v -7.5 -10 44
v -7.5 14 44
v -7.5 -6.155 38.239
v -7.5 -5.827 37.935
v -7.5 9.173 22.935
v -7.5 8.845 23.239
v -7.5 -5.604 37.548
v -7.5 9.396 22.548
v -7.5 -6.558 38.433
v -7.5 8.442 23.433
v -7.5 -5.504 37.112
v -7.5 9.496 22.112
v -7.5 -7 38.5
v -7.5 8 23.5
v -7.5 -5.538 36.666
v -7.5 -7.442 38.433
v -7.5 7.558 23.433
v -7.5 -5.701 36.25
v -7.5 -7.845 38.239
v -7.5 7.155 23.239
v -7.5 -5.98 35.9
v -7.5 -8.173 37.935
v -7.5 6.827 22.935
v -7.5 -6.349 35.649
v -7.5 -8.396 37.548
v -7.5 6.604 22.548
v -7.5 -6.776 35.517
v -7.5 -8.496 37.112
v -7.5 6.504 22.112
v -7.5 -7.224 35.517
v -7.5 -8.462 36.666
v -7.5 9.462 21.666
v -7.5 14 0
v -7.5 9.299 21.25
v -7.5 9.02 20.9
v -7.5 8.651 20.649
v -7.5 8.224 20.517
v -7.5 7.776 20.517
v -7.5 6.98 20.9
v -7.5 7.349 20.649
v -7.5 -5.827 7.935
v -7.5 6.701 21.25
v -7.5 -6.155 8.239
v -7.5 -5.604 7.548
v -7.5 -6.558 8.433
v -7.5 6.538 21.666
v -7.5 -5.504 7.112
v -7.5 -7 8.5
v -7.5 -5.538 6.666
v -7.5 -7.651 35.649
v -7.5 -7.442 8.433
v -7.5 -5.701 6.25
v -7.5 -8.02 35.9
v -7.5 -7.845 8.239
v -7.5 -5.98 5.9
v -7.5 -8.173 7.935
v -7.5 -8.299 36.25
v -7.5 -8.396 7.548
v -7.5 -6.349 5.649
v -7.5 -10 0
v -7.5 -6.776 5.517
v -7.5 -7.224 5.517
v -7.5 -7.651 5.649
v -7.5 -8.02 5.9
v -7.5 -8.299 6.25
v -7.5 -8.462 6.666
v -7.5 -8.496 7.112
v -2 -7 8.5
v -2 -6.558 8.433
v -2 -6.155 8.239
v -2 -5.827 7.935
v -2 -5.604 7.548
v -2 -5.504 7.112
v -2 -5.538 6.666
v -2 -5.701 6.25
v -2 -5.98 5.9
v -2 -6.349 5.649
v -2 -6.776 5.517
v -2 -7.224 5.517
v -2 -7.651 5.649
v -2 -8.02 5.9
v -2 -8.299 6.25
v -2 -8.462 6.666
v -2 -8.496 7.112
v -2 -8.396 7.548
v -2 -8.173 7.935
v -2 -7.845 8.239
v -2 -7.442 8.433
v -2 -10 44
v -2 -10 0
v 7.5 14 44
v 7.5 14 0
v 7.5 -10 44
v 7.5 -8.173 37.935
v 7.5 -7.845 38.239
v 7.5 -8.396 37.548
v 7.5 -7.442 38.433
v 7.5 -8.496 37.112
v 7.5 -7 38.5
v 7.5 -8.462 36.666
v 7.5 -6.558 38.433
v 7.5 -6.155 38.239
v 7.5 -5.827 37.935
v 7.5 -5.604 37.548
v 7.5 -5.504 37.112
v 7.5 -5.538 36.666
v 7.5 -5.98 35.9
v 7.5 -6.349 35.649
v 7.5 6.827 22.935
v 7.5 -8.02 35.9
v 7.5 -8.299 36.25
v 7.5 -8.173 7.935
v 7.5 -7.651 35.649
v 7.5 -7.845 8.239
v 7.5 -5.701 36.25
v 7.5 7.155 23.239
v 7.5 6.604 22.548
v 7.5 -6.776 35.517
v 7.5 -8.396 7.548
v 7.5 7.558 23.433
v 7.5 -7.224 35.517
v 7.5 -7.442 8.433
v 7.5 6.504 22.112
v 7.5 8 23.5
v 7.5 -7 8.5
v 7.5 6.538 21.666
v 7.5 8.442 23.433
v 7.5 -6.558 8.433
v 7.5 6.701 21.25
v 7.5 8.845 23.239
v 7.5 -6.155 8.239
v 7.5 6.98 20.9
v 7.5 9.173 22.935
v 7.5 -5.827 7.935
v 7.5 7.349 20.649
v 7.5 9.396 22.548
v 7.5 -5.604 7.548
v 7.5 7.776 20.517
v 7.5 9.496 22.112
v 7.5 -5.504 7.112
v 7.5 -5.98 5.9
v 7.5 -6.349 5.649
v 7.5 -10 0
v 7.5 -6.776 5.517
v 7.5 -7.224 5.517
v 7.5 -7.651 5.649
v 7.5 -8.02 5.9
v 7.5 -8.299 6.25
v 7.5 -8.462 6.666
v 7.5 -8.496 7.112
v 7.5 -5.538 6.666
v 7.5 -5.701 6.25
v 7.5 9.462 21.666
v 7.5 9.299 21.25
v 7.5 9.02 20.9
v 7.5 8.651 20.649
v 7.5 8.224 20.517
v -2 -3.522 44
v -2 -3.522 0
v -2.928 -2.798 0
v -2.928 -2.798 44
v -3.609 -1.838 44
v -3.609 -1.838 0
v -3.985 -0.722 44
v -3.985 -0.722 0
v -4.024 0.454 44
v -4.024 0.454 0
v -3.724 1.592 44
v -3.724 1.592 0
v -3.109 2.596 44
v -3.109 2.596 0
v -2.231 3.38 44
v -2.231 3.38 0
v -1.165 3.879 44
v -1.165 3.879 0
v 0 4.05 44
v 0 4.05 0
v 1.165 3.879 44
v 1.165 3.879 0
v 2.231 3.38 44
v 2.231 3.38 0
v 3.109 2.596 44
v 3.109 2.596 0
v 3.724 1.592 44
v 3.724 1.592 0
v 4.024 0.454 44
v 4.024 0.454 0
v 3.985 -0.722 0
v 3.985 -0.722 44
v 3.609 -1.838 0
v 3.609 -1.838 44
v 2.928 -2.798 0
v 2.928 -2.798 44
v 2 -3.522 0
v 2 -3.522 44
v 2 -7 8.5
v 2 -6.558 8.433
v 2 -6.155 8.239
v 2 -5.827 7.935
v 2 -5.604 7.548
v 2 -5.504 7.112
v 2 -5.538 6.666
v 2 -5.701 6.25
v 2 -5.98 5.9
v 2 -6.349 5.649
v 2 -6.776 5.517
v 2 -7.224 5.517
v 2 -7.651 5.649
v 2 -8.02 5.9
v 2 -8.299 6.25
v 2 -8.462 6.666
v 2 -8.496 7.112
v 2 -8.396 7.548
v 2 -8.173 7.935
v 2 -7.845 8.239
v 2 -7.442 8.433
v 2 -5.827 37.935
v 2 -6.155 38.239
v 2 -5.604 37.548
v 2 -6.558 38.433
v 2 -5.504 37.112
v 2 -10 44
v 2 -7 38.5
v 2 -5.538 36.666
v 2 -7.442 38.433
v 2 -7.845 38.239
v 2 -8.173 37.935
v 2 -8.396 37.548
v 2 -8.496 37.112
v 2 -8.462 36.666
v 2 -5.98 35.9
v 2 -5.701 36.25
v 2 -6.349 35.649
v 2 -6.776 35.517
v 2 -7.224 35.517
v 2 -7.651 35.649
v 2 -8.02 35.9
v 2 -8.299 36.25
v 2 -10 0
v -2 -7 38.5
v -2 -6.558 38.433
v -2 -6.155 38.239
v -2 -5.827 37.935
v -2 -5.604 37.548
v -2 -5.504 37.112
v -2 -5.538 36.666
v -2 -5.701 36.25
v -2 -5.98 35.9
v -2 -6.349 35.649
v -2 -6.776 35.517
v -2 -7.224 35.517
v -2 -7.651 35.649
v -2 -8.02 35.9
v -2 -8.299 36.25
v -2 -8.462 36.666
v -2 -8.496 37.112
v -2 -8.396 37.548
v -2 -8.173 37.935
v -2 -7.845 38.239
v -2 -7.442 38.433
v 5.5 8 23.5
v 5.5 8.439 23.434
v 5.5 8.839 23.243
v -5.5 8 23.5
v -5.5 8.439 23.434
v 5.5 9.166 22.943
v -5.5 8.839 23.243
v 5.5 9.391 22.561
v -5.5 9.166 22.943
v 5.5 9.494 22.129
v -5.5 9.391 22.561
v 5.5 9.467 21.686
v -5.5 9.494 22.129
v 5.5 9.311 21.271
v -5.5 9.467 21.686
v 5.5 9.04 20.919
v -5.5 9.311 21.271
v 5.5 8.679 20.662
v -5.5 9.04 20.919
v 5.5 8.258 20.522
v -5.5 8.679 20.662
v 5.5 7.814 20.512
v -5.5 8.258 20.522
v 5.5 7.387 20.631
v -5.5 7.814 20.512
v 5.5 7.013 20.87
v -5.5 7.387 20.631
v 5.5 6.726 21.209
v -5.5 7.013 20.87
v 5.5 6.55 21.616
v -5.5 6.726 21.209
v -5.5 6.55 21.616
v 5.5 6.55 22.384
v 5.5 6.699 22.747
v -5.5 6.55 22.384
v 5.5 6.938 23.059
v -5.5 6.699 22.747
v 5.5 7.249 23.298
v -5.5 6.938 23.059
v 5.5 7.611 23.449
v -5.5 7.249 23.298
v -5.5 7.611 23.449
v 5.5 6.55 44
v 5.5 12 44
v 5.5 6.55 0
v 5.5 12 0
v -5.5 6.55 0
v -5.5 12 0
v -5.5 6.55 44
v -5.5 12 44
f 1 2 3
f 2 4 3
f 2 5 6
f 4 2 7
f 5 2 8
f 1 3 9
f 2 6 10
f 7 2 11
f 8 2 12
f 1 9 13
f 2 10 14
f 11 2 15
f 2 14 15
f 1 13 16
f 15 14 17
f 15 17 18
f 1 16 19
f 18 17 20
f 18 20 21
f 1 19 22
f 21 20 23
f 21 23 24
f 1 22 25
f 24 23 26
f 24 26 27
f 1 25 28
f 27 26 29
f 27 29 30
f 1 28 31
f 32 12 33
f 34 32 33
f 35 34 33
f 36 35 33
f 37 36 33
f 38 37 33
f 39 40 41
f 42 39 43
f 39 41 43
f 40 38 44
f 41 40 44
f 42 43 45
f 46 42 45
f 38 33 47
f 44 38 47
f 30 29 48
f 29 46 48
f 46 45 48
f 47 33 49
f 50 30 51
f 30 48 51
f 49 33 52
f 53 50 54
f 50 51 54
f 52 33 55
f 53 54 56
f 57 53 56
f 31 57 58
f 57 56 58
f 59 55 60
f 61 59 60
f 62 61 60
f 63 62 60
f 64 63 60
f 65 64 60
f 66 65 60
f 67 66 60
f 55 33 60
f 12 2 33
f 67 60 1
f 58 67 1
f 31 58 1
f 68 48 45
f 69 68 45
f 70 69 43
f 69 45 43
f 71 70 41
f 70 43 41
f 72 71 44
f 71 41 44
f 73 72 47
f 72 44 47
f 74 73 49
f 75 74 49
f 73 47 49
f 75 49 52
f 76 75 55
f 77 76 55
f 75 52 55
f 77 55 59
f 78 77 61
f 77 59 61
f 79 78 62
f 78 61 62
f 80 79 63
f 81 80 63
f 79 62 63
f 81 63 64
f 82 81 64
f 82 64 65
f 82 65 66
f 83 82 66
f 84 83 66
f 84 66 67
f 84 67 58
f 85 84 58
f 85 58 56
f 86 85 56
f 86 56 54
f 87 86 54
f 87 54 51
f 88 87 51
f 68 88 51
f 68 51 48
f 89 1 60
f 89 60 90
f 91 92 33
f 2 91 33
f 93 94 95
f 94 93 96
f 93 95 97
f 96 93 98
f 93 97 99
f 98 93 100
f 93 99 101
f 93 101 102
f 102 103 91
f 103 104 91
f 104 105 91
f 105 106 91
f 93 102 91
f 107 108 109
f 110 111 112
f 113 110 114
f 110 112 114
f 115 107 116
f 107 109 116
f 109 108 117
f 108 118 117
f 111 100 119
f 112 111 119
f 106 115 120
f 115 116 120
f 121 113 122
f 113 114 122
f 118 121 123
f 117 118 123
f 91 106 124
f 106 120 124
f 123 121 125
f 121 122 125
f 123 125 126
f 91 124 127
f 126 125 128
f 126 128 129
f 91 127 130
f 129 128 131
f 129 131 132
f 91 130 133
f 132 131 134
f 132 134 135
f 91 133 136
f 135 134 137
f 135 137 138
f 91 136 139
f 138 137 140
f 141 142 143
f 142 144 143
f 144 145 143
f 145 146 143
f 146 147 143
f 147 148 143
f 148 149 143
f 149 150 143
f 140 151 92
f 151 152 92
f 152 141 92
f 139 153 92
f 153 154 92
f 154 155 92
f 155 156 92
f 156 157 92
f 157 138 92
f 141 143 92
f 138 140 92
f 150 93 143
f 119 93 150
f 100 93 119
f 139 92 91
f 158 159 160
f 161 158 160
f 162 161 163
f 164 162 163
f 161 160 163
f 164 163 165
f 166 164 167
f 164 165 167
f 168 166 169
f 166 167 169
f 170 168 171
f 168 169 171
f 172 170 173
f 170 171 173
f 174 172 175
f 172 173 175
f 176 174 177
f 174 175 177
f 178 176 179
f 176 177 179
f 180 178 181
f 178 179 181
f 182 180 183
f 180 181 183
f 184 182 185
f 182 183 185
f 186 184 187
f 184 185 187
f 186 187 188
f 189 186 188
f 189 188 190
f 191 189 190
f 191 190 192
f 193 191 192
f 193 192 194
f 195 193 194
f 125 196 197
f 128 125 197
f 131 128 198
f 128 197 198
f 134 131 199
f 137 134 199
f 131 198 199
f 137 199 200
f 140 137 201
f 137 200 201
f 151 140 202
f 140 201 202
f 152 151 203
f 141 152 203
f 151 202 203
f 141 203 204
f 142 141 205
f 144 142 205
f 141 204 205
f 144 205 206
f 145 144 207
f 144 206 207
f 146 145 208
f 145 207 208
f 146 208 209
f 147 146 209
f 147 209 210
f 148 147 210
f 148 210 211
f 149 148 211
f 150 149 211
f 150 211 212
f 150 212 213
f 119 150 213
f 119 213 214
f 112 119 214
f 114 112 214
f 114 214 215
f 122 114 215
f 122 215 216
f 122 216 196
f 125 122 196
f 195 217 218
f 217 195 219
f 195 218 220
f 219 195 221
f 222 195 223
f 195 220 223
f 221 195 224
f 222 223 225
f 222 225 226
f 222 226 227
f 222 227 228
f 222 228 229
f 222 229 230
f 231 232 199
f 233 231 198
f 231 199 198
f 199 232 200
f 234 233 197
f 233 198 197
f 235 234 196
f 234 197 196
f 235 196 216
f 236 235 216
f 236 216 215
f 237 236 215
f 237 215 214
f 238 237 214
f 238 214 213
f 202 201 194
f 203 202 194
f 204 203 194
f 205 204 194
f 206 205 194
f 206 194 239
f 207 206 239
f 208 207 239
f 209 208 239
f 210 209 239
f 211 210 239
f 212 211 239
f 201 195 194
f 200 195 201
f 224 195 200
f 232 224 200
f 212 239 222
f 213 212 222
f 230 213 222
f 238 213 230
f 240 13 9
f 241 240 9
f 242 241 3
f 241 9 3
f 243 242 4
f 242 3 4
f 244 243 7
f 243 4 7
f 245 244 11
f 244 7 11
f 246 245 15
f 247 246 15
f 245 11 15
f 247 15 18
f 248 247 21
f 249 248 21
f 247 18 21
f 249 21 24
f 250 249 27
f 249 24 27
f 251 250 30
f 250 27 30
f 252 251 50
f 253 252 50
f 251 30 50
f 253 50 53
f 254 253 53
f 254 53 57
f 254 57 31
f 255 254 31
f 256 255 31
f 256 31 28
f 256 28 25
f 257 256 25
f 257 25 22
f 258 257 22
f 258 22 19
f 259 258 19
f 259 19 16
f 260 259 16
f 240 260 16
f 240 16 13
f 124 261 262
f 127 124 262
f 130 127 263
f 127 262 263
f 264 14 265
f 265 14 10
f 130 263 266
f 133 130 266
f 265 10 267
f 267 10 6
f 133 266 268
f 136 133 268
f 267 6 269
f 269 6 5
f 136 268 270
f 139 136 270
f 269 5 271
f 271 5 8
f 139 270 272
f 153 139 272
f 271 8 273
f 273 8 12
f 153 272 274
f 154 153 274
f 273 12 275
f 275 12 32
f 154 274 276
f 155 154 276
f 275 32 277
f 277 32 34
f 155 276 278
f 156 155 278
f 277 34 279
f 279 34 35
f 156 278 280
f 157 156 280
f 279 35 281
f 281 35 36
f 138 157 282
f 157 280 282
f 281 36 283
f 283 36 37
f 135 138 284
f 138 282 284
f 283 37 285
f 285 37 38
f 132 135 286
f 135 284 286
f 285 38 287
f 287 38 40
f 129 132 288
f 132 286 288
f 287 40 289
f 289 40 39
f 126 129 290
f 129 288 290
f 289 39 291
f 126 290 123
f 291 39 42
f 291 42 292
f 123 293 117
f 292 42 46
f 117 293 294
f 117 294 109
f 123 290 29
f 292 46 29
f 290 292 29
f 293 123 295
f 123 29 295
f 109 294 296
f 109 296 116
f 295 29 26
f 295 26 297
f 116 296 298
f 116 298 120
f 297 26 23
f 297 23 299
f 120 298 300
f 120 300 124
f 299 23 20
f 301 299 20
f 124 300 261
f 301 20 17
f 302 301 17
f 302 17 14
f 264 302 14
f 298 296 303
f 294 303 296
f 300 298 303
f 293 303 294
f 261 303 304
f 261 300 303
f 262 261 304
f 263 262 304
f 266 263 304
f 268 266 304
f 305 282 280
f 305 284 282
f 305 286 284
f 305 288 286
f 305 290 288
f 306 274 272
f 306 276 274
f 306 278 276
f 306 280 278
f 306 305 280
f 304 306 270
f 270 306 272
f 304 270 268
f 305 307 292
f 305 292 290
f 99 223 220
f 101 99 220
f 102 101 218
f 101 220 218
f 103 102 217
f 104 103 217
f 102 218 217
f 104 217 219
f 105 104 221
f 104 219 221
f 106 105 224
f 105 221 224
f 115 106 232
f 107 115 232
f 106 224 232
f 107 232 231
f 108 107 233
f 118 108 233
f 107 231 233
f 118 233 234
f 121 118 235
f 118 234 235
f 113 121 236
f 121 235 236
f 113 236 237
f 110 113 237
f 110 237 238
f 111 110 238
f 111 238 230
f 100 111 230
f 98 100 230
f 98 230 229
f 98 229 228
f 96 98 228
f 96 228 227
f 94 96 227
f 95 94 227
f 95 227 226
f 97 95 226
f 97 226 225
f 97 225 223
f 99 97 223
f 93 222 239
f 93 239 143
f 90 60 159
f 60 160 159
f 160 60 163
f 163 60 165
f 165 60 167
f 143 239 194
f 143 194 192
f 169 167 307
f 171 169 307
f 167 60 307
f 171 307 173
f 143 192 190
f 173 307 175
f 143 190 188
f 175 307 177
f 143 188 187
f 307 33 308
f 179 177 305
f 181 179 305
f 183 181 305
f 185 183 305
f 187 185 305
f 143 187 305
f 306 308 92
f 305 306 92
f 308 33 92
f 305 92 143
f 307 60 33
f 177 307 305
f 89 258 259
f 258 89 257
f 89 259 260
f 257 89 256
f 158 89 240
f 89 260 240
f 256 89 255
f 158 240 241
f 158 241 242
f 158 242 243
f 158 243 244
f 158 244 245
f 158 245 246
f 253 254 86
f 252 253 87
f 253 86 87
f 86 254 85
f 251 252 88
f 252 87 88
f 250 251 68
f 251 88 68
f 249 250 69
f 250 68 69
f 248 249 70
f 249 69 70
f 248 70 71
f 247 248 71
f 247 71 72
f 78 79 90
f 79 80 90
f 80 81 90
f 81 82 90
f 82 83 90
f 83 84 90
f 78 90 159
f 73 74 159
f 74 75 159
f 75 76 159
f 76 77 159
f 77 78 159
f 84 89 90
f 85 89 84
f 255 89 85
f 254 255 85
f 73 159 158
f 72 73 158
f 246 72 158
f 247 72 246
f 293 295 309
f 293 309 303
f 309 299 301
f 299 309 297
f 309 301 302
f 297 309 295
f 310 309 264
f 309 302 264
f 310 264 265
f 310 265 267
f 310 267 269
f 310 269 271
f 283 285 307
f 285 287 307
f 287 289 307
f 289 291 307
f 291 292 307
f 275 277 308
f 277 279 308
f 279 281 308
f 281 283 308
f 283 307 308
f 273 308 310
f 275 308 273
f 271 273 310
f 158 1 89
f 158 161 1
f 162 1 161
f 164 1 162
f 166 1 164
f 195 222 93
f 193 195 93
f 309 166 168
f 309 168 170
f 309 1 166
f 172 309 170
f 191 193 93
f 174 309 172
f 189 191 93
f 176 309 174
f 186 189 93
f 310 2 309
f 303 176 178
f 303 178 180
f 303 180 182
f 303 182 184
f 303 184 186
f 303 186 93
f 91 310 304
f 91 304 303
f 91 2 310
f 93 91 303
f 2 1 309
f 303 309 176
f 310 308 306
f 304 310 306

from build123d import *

# Parameters (mm, degrees)
SKETCH_1_W          = 11
SKETCH_1_H          = 5.45
EXTRUDE_1_DEPTH     = 44
SKETCH_3_R          = 1.5
CUT_EXTRUDE_2_DEPTH = 49.548944376


with BuildPart() as part:
    # 草图1 → 凸台-拉伸1 (new body)
    with BuildSketch(Plane.XY):
        with BuildLine():
            Line((2, -10), (7.5, -10))
            Line((7.5, -10), (7.5, 14))
            Line((7.5, 14), (-7.5, 14))
            Line((-7.5, 14), (-7.5, -10))
            Line((-7.5, -10), (-2, -10))
            Line((-2, -10), (-2, -3.521718331))
            ThreePointArc((-2, -3.521718331), (0, 4.05), (2, -3.521718331))
            Line((2, -3.521718331), (2, -10))
        make_face()
        with Locations((0, 9.275)):
            Rectangle(SKETCH_1_W, SKETCH_1_H, mode=Mode.SUBTRACT)
    extrude(amount=EXTRUDE_1_DEPTH)

    # 草图3 → 切除-拉伸2 (cut, through all)
    with BuildSketch(Plane.ZY.offset(7.5)):
        with Locations((7, -7)):
            Circle(SKETCH_3_R)
        with Locations((37, -7)):
            Circle(SKETCH_3_R)
        with Locations((22, 8)):
            Circle(SKETCH_3_R)
    extrude(amount=-CUT_EXTRUDE_2_DEPTH, mode=Mode.SUBTRACT)


solid = part.part
